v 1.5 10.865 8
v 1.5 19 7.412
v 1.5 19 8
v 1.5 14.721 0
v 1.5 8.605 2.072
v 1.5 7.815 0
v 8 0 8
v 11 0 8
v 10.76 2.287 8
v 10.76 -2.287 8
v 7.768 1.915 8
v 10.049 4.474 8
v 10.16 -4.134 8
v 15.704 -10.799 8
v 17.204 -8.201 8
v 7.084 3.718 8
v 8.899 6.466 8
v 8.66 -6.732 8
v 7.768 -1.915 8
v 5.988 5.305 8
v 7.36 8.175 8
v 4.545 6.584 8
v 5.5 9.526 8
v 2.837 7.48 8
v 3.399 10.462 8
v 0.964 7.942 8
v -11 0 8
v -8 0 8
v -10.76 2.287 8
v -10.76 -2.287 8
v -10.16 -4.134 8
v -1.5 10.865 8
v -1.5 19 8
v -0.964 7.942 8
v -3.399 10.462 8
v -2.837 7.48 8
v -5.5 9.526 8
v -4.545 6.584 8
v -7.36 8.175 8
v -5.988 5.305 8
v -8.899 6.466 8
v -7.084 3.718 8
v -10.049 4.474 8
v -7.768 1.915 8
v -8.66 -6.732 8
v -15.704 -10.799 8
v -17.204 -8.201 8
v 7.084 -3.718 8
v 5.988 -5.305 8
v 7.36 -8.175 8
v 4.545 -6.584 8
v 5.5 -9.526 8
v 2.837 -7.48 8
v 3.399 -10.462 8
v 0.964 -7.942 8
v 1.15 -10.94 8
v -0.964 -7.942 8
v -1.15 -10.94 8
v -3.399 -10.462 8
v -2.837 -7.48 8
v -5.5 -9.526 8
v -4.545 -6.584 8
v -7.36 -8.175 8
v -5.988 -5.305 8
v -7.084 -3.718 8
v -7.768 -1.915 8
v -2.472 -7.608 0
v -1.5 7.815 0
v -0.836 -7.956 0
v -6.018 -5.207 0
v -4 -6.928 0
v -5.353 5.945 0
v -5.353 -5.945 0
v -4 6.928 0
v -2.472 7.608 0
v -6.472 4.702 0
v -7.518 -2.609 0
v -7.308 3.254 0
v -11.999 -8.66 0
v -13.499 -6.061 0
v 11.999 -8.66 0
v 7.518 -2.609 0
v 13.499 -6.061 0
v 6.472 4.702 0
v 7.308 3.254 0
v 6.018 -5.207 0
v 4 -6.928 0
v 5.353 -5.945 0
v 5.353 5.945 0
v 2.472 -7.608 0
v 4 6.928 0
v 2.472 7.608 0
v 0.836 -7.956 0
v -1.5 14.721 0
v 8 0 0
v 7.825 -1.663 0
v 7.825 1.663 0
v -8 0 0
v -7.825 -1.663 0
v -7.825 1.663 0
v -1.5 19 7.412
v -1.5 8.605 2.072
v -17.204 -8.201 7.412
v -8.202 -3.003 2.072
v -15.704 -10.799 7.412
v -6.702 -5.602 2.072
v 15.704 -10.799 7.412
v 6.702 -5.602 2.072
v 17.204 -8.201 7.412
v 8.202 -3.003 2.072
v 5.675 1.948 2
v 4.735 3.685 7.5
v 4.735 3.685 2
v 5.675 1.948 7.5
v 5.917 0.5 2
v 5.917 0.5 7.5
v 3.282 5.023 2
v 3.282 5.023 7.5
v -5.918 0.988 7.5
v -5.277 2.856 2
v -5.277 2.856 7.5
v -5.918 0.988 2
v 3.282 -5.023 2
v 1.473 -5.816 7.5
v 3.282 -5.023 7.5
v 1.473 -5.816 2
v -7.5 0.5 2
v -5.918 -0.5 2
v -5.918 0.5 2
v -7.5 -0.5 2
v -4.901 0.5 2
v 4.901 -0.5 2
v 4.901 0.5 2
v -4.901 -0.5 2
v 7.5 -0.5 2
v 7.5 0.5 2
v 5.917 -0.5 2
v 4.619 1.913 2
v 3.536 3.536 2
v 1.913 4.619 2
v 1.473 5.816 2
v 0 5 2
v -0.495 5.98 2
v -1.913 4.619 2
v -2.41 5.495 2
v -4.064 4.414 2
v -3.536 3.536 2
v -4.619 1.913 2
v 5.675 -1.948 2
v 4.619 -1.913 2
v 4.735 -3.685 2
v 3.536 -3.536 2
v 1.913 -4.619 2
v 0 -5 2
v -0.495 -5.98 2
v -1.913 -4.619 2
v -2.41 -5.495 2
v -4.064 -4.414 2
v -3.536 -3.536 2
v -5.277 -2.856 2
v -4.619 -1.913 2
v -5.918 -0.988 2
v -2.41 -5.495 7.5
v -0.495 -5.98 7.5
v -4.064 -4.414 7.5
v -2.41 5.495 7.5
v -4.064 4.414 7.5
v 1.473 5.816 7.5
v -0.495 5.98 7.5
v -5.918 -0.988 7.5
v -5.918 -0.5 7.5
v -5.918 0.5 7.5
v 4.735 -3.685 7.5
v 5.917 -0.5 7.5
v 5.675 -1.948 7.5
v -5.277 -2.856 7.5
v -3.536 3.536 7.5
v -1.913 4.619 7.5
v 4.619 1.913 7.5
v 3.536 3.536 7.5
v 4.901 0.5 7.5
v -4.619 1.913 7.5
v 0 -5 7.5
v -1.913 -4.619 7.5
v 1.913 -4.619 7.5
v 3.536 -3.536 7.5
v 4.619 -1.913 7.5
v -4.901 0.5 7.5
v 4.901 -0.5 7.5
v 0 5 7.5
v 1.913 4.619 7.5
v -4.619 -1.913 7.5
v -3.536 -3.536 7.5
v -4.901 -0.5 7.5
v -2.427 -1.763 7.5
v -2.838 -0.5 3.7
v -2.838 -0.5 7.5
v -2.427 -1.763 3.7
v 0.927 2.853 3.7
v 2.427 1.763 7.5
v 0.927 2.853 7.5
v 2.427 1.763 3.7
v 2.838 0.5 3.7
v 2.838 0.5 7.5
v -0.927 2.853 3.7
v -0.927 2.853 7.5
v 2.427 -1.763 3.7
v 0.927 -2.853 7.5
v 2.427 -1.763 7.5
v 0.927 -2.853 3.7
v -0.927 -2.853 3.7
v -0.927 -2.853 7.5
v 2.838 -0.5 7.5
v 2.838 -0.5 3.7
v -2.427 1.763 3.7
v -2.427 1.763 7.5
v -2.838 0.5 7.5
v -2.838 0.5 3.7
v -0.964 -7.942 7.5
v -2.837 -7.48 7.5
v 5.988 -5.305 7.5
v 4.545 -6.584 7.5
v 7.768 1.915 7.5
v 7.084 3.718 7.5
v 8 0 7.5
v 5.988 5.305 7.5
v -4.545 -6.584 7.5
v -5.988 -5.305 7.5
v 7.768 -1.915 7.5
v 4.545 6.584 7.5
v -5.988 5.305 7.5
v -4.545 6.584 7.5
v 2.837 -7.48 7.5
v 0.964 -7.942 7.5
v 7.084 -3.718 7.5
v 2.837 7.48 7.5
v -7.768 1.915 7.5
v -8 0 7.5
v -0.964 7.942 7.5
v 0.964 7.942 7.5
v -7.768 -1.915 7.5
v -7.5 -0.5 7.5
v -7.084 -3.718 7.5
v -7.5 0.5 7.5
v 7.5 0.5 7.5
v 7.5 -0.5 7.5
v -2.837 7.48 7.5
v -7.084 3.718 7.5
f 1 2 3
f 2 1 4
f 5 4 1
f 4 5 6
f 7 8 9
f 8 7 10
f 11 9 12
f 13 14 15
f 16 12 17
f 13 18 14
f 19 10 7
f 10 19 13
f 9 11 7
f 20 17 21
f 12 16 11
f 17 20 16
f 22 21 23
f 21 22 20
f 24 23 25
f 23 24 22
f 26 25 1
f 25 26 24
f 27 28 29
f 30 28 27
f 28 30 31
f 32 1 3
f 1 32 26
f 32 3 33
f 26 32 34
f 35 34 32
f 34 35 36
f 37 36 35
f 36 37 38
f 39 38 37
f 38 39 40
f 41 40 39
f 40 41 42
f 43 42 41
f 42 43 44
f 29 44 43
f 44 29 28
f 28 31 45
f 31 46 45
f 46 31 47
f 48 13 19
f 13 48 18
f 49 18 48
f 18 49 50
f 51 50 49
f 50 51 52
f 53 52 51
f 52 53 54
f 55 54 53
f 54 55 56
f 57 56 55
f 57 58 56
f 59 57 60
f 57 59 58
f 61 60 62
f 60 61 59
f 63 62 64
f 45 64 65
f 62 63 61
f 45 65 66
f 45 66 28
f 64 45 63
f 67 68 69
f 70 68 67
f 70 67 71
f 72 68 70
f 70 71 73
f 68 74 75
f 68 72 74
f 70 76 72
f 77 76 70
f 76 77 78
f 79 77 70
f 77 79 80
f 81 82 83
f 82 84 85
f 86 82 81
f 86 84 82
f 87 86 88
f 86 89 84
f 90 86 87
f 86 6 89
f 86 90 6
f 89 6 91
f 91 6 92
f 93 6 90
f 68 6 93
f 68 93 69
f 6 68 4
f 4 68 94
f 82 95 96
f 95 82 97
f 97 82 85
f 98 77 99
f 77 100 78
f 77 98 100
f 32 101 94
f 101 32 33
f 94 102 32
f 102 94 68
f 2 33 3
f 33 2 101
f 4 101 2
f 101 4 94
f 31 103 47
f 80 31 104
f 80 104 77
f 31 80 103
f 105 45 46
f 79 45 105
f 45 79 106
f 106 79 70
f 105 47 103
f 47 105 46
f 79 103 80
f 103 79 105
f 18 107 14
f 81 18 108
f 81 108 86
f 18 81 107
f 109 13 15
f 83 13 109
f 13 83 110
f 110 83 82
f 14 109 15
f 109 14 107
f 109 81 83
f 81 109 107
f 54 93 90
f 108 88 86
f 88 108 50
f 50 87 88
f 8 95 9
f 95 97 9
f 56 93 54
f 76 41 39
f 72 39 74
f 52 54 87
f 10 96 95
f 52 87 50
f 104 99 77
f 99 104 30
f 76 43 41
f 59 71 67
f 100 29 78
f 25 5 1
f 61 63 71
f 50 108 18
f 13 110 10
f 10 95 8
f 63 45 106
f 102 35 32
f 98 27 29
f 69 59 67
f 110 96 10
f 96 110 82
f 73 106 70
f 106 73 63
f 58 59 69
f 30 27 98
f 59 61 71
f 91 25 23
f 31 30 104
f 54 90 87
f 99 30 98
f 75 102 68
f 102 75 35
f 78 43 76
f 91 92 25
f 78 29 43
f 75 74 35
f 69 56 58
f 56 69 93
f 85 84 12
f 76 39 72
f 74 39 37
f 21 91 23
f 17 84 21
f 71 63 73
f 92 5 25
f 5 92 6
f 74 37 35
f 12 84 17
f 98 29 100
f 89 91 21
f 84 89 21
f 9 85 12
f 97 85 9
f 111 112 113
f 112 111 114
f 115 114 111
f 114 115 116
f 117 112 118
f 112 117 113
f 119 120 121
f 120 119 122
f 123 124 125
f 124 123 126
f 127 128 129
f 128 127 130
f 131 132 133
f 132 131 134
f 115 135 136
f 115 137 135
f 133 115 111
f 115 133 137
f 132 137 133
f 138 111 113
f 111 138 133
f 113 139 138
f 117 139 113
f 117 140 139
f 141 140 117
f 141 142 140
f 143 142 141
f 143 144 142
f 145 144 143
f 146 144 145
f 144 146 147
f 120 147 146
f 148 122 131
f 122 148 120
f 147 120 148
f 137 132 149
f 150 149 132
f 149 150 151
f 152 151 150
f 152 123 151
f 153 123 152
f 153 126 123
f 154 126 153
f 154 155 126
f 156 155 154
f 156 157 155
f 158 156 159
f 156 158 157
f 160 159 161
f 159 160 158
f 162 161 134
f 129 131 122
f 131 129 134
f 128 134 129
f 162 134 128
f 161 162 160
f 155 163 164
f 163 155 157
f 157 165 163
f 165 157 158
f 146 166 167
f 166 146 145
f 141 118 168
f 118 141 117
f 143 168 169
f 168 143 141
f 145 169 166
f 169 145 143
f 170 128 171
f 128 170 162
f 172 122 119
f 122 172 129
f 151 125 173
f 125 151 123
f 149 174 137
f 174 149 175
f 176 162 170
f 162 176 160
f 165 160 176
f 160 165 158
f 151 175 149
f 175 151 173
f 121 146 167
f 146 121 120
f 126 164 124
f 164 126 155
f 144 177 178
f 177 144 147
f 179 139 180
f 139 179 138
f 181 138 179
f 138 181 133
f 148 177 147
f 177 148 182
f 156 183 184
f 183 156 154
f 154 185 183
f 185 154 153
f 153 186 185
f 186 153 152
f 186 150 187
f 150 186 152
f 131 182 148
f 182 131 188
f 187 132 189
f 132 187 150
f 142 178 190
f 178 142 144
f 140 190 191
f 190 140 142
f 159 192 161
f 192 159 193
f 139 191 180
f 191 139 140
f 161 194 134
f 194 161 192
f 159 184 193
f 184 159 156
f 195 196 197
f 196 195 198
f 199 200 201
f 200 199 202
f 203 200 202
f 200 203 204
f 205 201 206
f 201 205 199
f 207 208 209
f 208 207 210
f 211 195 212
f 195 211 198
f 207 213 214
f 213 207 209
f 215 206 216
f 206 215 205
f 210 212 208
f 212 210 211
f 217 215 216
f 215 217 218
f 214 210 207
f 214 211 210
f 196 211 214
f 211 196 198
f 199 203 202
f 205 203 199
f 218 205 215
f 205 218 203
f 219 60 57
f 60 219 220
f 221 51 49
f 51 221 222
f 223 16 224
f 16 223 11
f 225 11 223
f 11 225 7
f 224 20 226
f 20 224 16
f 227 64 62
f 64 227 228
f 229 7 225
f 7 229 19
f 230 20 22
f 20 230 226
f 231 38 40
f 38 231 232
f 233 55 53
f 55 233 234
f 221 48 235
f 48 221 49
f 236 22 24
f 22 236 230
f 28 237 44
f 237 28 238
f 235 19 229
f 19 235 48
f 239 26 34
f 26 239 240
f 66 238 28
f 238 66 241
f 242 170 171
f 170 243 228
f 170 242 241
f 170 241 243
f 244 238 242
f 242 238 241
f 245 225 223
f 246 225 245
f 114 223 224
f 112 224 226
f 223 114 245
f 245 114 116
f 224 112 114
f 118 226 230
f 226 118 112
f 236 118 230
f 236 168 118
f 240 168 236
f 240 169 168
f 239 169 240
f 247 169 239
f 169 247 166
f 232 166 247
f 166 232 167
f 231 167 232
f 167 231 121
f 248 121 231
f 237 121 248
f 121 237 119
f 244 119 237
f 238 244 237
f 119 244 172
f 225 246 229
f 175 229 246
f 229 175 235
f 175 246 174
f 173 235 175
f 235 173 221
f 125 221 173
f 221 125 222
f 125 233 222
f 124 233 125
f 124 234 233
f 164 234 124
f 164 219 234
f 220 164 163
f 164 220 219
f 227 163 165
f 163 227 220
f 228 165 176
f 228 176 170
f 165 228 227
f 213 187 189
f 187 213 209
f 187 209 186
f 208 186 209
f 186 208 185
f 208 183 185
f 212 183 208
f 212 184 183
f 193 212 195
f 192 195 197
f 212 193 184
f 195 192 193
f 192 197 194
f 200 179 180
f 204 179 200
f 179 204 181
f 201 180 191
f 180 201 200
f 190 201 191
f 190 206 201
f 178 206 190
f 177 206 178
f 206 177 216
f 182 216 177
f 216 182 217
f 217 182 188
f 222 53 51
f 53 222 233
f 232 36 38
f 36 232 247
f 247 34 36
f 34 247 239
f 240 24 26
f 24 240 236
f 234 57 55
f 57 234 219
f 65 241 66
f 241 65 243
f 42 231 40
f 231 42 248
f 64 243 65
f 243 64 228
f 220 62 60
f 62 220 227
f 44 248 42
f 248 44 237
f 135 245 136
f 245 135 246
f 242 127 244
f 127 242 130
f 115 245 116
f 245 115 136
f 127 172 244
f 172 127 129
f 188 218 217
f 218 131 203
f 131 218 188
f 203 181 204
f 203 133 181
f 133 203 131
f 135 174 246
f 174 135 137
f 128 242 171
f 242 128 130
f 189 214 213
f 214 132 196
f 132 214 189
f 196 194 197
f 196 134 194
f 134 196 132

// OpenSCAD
// PIRANHA iteration1
// LCD cover
// GNU GPL v3
// Usan Siriwardana <usiriwar@uwaterloo.ca> and contributors
// based on Prusa i3 MK3S
// https://reprap.org/wiki/Prusa_i3_MK3

module handle(){
    difference(){
        cube([3, 12, 8], center = true);
        translate([0, 15, -1]) rotate([-30, 0, 0])cube(20, center=true);
    }
}

module main(){
    difference(){
        union(){
            // central hub
            cylinder(8, 8, 11);
        
            // handles
            rotate([0, 0, 0]) translate([0, 13, 4]) handle();
            rotate([0, 0, 120]) translate([0, 13, 4]) handle();
            rotate([0, 0, -120]) translate([0, 13, 4]) handle();
        }
        translate([0, 0, 8]) cylinder(1, 8, 8, center=true);
        translate([0, 0, 5]) cube([15, 1, 6], center = true);
        
        // cut out fingers to grab encoder shaft
        translate([0, 0, 2]) union(){
            difference(){
                cylinder(6, 6, 6);
                cylinder(6.1, 5, 5);
            }
            translate([0, 0, 1.7]) cylinder(4.3, 3, 3);
        }
    }
    
}


//handle();
main();
